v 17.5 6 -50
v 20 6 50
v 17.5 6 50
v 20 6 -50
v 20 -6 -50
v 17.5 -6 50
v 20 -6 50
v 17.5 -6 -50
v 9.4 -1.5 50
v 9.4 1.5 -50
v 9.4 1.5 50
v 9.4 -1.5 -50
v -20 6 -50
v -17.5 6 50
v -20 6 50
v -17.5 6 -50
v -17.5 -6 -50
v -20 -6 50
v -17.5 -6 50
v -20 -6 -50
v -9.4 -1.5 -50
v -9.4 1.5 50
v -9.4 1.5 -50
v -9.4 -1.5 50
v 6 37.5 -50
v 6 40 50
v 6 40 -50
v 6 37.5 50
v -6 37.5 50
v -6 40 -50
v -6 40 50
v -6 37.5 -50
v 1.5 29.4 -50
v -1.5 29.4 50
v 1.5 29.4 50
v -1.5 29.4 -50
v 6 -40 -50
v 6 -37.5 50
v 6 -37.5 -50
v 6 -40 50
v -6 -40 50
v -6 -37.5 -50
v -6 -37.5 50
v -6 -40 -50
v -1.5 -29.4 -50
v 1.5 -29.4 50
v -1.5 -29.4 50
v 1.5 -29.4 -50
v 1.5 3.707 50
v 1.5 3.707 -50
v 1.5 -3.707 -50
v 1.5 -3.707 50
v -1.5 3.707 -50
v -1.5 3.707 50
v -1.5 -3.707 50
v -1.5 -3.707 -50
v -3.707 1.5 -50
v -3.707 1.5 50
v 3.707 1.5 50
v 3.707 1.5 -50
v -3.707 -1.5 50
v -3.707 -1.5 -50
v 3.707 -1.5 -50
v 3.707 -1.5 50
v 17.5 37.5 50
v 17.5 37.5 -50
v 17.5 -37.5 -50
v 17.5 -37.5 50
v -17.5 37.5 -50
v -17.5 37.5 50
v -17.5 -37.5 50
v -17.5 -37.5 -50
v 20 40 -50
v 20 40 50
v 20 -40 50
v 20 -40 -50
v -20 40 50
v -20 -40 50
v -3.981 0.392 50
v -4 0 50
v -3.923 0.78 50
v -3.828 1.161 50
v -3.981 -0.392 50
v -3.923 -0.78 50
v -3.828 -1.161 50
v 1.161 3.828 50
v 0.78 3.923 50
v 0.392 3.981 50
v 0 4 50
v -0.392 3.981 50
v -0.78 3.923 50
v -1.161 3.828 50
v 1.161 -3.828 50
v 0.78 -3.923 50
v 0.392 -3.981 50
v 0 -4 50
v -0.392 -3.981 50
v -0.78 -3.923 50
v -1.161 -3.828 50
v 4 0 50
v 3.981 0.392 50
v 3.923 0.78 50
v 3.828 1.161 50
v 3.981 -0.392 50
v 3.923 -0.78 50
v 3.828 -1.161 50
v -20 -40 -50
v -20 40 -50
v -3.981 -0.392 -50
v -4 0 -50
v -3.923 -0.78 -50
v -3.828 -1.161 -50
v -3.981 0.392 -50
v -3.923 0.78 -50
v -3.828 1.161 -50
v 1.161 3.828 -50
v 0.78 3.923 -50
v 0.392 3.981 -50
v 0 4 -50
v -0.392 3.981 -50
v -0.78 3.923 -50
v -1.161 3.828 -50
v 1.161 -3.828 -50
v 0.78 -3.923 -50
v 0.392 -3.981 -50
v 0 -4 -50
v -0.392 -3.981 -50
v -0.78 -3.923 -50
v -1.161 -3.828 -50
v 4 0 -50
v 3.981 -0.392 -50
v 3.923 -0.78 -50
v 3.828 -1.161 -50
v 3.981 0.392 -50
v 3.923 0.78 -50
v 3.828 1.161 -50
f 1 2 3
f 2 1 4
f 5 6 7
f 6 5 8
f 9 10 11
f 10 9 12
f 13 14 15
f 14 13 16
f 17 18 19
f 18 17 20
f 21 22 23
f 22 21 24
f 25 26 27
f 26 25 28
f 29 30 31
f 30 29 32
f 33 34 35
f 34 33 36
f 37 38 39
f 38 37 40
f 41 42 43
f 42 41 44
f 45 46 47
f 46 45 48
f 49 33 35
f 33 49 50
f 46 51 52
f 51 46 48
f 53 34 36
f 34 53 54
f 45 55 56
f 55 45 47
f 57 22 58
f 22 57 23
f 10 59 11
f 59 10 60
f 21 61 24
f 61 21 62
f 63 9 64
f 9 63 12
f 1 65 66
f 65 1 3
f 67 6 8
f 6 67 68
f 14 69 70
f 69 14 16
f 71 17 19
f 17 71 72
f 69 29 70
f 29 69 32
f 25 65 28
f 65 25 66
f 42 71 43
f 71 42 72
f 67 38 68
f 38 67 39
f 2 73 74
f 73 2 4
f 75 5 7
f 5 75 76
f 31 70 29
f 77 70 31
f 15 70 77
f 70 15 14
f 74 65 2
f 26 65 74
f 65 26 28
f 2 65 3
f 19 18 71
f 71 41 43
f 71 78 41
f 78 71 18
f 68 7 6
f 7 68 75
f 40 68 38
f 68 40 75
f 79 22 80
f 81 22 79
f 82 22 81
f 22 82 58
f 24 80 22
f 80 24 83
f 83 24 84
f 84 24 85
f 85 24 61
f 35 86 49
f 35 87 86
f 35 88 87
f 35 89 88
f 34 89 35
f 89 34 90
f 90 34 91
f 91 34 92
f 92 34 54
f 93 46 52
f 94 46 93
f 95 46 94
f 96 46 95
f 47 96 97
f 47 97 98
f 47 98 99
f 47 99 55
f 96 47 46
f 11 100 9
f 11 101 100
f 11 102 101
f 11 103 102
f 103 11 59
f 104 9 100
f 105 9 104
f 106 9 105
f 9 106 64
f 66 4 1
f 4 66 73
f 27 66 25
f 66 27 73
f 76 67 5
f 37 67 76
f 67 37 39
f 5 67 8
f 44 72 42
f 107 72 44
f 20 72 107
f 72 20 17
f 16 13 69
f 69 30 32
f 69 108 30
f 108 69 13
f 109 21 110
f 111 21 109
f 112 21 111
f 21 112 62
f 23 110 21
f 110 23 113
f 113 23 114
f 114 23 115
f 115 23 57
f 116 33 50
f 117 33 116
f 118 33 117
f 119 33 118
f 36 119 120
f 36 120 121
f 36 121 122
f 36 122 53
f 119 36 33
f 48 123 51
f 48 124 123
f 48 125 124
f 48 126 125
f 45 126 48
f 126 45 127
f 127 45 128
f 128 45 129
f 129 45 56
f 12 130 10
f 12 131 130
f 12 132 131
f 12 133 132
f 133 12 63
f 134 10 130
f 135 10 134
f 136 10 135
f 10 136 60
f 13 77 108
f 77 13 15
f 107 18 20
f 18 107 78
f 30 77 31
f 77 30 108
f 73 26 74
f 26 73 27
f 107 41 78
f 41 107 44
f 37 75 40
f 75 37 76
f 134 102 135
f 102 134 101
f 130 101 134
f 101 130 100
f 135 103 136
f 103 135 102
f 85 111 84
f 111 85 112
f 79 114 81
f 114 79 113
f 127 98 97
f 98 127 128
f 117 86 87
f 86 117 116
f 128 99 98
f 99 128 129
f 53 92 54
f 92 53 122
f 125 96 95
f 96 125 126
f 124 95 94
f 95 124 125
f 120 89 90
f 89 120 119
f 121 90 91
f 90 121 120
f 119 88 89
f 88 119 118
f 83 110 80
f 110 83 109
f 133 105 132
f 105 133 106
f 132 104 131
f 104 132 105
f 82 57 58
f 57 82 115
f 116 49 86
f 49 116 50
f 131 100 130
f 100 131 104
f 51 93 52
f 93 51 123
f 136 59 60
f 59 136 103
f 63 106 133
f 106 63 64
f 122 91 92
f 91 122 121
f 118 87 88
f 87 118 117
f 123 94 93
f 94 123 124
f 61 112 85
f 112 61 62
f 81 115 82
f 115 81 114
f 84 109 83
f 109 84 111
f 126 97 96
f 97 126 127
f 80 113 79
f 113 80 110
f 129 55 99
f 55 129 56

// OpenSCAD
// 40x80 aluminium T-slot extrusion (approximate "typical" profile), 100mm long
// Single connected solid (one body with internal voids/slots removed)

$fn = 64;

// Parameters (fixed to requested size)
cross_section_width_mm  = 40.0;
cross_section_height_mm = 80.0;
length_mm               = 100.0;

wall_thickness_mm       = 2.5;   // outer wall
slot_opening_mm         = 6.0;   // mouth opening at surface
slot_internal_width_mm  = 12.0;  // wider internal cavity behind mouth
slot_depth_mm           = 10.0;  // depth from surface into profile

center_bore_diameter_mm = 8.0;   // typical center bore
web_thickness_mm        = 3.0;   // internal webs thickness

overlap_mm              = 0.6;   // boolean overlap

module tslot_cut_x(side=1) {
    // Cuts a T-slot on +X (side=+1) or -X (side=-1) face
    w = cross_section_width_mm;
    h = cross_section_height_mm;
    L = length_mm;

    // Place the slot so its outer face is flush with the profile surface
    // Slot extends inward by slot_depth_mm
    x_center = side * (w/2 - slot_depth_mm/2);

    union() {
        // Internal cavity (wider)
        translate([x_center, 0, 0])
            cube([slot_depth_mm + overlap_mm, slot_internal_width_mm, L + 2*overlap_mm], center=true);

        // Mouth opening (narrower) - ensure it reaches the surface
        translate([side*(w/2 - (slot_depth_mm + overlap_mm)/2), 0, 0])
            cube([slot_depth_mm + overlap_mm, slot_opening_mm, L + 2*overlap_mm], center=true);
    }
}

module tslot_cut_y(side=1) {
    // Cuts a T-slot on +Y (side=+1) or -Y (side=-1) face
    w = cross_section_width_mm;
    h = cross_section_height_mm;
    L = length_mm;

    y_center = side * (h/2 - slot_depth_mm/2);

    union() {
        translate([0, y_center, 0])
            cube([slot_internal_width_mm, slot_depth_mm + overlap_mm, L + 2*overlap_mm], center=true);

        translate([0, side*(h/2 - (slot_depth_mm + overlap_mm)/2), 0])
            cube([slot_opening_mm, slot_depth_mm + overlap_mm, L + 2*overlap_mm], center=true);
    }
}

module internal_voids() {
    w = cross_section_width_mm;
    h = cross_section_height_mm;
    L = length_mm;

    // Keep a ring of material near the outer wall and leave internal webs
    // Central rectangular void (leaves outer wall thickness)
    inner_w = w - 2*wall_thickness_mm;
    inner_h = h - 2*wall_thickness_mm;

    // Webs: vertical and horizontal bars through the center
    // We'll subtract the inner void but "add back" webs by not subtracting them:
    // Implemented by subtracting inner void minus webs (i.e., subtract inner void with webs removed)
    difference() {
        // Inner void volume
        cube([inner_w, inner_h, L + 2*overlap_mm], center=true);

        // Remove from the void the web volumes so they remain solid in the final part
        union() {
            // Vertical web (along Y)
            cube([web_thickness_mm, inner_h + 2*overlap_mm, L + 4*overlap_mm], center=true);
            // Horizontal web (along X)
            cube([inner_w + 2*overlap_mm, web_thickness_mm, L + 4*overlap_mm], center=true);
        }
    }
}

module extrusion_40x80() {
    w = cross_section_width_mm;
    h = cross_section_height_mm;
    L = length_mm;

    color("Silver")
    difference() {
        // Outer body
        cube([w, h, L], center=true);

        // Outer T-slots on all 4 faces
        union() {
            tslot_cut_x(+1);
            tslot_cut_x(-1);
            tslot_cut_y(+1);
            tslot_cut_y(-1);
        }

        // Internal void structure (typical extrusion hollows)
        internal_voids();

        // Center bore
        cylinder(d=center_bore_diameter_mm, h=L + 2*overlap_mm, center=true);
    }
}

extrusion_40x80();
